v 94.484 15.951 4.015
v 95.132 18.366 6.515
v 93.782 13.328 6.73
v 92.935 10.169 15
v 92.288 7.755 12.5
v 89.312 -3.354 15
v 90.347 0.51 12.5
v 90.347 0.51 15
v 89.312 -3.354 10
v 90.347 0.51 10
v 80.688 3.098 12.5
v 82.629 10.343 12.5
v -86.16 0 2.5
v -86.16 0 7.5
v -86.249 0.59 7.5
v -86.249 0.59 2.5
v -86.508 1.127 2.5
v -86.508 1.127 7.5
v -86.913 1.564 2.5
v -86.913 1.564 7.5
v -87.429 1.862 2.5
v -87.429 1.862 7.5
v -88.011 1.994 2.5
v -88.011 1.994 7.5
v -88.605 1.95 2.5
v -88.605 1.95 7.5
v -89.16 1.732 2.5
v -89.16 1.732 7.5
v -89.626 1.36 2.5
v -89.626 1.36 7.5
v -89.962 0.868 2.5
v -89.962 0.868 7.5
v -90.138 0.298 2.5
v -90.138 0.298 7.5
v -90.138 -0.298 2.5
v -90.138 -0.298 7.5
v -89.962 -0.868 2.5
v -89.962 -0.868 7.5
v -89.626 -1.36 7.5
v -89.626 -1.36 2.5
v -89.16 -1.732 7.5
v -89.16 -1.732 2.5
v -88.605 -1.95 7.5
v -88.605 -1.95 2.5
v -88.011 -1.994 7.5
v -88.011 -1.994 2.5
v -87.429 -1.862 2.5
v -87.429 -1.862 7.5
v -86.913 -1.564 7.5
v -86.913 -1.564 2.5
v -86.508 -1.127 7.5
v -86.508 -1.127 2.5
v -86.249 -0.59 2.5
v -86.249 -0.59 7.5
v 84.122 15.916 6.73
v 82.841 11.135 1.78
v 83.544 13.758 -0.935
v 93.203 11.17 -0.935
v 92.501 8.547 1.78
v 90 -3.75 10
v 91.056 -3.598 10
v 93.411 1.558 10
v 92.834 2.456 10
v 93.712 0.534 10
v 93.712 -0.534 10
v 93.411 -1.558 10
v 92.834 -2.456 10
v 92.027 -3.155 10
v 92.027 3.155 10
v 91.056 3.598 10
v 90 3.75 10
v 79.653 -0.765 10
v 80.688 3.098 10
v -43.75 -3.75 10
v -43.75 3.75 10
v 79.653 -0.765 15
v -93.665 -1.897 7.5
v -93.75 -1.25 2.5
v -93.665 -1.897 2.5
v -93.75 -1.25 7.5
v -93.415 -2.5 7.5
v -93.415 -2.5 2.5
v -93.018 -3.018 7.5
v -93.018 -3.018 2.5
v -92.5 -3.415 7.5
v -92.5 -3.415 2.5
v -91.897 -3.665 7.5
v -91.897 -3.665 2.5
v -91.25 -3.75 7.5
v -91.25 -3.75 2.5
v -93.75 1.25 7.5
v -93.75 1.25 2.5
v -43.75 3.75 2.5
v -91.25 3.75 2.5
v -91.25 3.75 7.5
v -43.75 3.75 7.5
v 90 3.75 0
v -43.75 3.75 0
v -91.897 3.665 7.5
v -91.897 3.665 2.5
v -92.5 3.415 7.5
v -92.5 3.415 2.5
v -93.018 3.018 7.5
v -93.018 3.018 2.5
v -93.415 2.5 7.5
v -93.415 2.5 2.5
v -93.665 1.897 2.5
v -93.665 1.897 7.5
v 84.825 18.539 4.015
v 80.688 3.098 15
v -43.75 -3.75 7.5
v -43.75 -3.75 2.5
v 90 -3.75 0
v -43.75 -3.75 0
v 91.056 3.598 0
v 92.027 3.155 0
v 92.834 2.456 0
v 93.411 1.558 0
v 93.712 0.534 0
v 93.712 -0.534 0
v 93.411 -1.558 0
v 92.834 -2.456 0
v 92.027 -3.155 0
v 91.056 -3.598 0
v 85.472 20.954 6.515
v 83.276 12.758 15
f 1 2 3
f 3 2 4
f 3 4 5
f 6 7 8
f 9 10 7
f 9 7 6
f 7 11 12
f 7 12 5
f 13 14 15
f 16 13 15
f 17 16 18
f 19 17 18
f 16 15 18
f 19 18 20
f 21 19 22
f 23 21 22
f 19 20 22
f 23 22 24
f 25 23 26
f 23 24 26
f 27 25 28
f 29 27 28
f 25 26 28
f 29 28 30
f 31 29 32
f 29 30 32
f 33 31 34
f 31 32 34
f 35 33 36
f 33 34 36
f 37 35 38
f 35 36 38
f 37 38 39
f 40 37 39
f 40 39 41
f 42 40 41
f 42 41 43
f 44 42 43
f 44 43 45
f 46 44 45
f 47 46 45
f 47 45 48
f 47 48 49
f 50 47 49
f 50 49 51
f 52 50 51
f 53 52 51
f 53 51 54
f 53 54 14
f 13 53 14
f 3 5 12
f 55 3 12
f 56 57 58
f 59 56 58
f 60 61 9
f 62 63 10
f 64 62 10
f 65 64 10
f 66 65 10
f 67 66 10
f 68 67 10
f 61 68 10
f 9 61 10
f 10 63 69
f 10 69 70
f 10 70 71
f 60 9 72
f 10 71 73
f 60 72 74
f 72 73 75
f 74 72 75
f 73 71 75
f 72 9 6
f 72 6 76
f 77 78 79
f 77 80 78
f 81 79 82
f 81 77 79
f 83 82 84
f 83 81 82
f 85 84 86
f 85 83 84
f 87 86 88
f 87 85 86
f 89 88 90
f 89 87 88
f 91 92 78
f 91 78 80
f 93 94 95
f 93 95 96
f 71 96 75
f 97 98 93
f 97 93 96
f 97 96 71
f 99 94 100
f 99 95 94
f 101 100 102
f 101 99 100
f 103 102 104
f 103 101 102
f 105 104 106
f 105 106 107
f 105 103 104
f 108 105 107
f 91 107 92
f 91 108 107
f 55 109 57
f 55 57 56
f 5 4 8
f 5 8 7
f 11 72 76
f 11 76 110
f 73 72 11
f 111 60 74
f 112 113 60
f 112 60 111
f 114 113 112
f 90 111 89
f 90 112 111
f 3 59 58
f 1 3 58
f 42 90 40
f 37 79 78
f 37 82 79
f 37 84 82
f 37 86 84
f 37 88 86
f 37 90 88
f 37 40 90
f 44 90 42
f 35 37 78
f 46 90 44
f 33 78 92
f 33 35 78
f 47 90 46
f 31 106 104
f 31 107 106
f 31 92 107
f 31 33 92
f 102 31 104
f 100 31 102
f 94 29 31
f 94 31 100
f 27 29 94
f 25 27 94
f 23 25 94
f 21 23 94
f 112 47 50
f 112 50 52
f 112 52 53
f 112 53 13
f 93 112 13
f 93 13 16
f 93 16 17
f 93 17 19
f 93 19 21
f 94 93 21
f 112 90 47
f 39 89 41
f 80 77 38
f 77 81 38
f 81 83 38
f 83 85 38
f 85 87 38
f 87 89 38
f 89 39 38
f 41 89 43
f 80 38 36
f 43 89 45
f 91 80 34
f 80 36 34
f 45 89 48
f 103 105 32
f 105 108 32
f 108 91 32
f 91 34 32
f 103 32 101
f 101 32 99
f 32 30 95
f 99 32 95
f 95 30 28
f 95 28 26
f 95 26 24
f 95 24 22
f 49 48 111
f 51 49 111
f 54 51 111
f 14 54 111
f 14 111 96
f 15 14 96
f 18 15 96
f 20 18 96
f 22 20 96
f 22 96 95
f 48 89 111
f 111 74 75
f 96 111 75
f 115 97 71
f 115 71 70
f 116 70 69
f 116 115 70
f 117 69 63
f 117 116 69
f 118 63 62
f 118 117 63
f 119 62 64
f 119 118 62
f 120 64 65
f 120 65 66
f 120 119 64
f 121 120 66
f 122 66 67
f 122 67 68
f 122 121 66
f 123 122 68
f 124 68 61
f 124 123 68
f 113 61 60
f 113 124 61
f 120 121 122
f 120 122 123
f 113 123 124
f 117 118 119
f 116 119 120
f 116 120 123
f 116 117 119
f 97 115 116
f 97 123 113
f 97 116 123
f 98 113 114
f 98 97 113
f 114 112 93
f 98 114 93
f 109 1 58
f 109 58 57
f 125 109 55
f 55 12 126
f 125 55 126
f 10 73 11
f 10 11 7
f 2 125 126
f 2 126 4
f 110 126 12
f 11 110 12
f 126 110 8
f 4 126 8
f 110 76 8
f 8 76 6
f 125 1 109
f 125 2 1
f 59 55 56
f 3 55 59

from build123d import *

# Parameters (mm, degrees)
SKETCH1_R            = 2
BOSS_EXTRUDE1_DEPTH  = 10
BOSS_EXTRUDE2_DEPTH  = 5
SKETCH11_W           = 10
SKETCH11_H           = 2.5
BOSS_EXTRUDE9_DEPTH  = 10
CHAMFER4_SIZE        = 2.5
BOSS_EXTRUDE10_DEPTH = 12
BOSS_EXTRUDE11_DEPTH = 7
SKETCH14_W           = 37.56586606
SKETCH14_H           = 7.5
CUT_EXTRUDE2_DEPTH   = 99.023663822
SKETCH15_W           = 5
SKETCH15_H           = 7.5
BOSS_EXTRUDE12_DEPTH = 50
FILLET1_R            = 2.5
FILLET2_R            = 2.5
SKETCH16_R           = 2
CUT_EXTRUDE3_DEPTH   = 50


with BuildPart() as part:
    # Sketch1 → Boss-Extrude1 (new body)
    with BuildSketch(Plane.XY):
        with BuildLine():
            Line((-90, 3.75), (90, 3.75))
            ThreePointArc((90, 3.75), (93.75, 0), (90, -3.75))
            Line((90, -3.75), (-90, -3.75))
            ThreePointArc((-90, -3.75), (-93.75, 0), (-90, 3.75))
        make_face()
        with Locations((-90, 0)):
            Circle(SKETCH1_R, mode=Mode.SUBTRACT)
    extrude(amount=BOSS_EXTRUDE1_DEPTH)

    # Sketch2 → Boss-Extrude2 (add)
    with BuildSketch(Plane.XY.offset(10)):
        Polygon((80.687913142, 3.098319394), (90.347171405, 0.510128943), (89.311895225, -3.353574362), (79.652636962, -0.765383911), align=None)
    extrude(amount=BOSS_EXTRUDE2_DEPTH)

    # Sketch11 → Boss-Extrude9 (add)
    with BuildSketch(Plane(origin=(6.17964514, 23.062749635, 0), x_dir=(0.9659258262890681, -0.25881904510252146, 0), z_dir=(0.25881904510252146, 0.9659258262890681, 0))):
        with Locations((82.136635107, -13.75)):
            Rectangle(SKETCH11_W, SKETCH11_H)
    extrude(amount=BOSS_EXTRUDE9_DEPTH)

    # Chamfer4
    chamfer4_edges = [part.edges().sort_by_distance(p)[0] for p in [
        (88.105732725, 11.463482432, 12.5),
    ]]
    chamfer(chamfer4_edges, length=CHAMFER4_SIZE - 0.0001)  # a hair under: the kernel refuses the full size

    # Sketch12 → Boss-Extrude10 (add)
    with BuildSketch(Plane(origin=(2.442774957, 9.116560252, -9.438157676), x_dir=(-0.9831105418930532, 0.12706287081893997, -0.1317144231965381), z_dir=(0.18301270189222077, 0.683012701892222, -0.7071067811865448))):
        Polygon((-91.390726655, 14.25109763), (-81.565745121, 16.113820866), (-82.224317237, 19.5874764), (-92.049298771, 17.724753164), align=None)
    extrude(amount=BOSS_EXTRUDE10_DEPTH)

    # Sketch13 → Boss-Extrude11 (add)
    with BuildSketch(Plane(origin=(5.678013021, 21.19063308, 21.938157676), x_dir=(-0.9831105418930535, 0.1270628708189395, 0.13171442319653667), z_dir=(-0.18301270189221938, -0.6830127018922167, -0.70710678118655))):
        Polygon((-90.333133958, 8.672797801), (-80.508152424, 10.535521038), (-79.792866702, 6.762728129), (-89.617848236, 4.900004892), align=None)
    extrude(amount=BOSS_EXTRUDE11_DEPTH)

    # Sketch14 → Cut-Extrude2 (cut, through all)
    with BuildSketch(Plane.XY.offset(10)):
        with Locations((-62.53293303, 0)):
            Rectangle(SKETCH14_W, SKETCH14_H)
    extrude(amount=-CUT_EXTRUDE2_DEPTH, mode=Mode.SUBTRACT)


with BuildPart() as body_2:
    # of the pieces the cut leaves, the one that is kept (cut_extrude2_keep)
    add(part.part.solids().sort_by_distance((79.652636962, -0.765383911, 15))[0])

    # Sketch15 → Boss-Extrude12 (add)
    with BuildSketch(Plane.ZY.offset(43.75)):
        with Locations((5, 0)):
            Rectangle(SKETCH15_W, SKETCH15_H)
    extrude(amount=BOSS_EXTRUDE12_DEPTH)

    # Fillet1
    fillet1_edges = [body_2.edges().sort_by_distance(p)[0] for p in [
        (-93.75, 3.75, 5),
    ]]
    fillet(fillet1_edges, radius=FILLET1_R)

    # Fillet2
    fillet2_edges = [body_2.edges().sort_by_distance(p)[0] for p in [
        (-93.75, -3.75, 5),
    ]]
    fillet(fillet2_edges, radius=FILLET2_R)

    # Sketch16 → Cut-Extrude3 (cut)
    with BuildSketch(Plane.XY.offset(7.5)):
        with Locations((-88.159990551, 0)):
            Circle(SKETCH16_R)
    extrude(amount=-CUT_EXTRUDE3_DEPTH, mode=Mode.SUBTRACT)


solid = body_2.part
